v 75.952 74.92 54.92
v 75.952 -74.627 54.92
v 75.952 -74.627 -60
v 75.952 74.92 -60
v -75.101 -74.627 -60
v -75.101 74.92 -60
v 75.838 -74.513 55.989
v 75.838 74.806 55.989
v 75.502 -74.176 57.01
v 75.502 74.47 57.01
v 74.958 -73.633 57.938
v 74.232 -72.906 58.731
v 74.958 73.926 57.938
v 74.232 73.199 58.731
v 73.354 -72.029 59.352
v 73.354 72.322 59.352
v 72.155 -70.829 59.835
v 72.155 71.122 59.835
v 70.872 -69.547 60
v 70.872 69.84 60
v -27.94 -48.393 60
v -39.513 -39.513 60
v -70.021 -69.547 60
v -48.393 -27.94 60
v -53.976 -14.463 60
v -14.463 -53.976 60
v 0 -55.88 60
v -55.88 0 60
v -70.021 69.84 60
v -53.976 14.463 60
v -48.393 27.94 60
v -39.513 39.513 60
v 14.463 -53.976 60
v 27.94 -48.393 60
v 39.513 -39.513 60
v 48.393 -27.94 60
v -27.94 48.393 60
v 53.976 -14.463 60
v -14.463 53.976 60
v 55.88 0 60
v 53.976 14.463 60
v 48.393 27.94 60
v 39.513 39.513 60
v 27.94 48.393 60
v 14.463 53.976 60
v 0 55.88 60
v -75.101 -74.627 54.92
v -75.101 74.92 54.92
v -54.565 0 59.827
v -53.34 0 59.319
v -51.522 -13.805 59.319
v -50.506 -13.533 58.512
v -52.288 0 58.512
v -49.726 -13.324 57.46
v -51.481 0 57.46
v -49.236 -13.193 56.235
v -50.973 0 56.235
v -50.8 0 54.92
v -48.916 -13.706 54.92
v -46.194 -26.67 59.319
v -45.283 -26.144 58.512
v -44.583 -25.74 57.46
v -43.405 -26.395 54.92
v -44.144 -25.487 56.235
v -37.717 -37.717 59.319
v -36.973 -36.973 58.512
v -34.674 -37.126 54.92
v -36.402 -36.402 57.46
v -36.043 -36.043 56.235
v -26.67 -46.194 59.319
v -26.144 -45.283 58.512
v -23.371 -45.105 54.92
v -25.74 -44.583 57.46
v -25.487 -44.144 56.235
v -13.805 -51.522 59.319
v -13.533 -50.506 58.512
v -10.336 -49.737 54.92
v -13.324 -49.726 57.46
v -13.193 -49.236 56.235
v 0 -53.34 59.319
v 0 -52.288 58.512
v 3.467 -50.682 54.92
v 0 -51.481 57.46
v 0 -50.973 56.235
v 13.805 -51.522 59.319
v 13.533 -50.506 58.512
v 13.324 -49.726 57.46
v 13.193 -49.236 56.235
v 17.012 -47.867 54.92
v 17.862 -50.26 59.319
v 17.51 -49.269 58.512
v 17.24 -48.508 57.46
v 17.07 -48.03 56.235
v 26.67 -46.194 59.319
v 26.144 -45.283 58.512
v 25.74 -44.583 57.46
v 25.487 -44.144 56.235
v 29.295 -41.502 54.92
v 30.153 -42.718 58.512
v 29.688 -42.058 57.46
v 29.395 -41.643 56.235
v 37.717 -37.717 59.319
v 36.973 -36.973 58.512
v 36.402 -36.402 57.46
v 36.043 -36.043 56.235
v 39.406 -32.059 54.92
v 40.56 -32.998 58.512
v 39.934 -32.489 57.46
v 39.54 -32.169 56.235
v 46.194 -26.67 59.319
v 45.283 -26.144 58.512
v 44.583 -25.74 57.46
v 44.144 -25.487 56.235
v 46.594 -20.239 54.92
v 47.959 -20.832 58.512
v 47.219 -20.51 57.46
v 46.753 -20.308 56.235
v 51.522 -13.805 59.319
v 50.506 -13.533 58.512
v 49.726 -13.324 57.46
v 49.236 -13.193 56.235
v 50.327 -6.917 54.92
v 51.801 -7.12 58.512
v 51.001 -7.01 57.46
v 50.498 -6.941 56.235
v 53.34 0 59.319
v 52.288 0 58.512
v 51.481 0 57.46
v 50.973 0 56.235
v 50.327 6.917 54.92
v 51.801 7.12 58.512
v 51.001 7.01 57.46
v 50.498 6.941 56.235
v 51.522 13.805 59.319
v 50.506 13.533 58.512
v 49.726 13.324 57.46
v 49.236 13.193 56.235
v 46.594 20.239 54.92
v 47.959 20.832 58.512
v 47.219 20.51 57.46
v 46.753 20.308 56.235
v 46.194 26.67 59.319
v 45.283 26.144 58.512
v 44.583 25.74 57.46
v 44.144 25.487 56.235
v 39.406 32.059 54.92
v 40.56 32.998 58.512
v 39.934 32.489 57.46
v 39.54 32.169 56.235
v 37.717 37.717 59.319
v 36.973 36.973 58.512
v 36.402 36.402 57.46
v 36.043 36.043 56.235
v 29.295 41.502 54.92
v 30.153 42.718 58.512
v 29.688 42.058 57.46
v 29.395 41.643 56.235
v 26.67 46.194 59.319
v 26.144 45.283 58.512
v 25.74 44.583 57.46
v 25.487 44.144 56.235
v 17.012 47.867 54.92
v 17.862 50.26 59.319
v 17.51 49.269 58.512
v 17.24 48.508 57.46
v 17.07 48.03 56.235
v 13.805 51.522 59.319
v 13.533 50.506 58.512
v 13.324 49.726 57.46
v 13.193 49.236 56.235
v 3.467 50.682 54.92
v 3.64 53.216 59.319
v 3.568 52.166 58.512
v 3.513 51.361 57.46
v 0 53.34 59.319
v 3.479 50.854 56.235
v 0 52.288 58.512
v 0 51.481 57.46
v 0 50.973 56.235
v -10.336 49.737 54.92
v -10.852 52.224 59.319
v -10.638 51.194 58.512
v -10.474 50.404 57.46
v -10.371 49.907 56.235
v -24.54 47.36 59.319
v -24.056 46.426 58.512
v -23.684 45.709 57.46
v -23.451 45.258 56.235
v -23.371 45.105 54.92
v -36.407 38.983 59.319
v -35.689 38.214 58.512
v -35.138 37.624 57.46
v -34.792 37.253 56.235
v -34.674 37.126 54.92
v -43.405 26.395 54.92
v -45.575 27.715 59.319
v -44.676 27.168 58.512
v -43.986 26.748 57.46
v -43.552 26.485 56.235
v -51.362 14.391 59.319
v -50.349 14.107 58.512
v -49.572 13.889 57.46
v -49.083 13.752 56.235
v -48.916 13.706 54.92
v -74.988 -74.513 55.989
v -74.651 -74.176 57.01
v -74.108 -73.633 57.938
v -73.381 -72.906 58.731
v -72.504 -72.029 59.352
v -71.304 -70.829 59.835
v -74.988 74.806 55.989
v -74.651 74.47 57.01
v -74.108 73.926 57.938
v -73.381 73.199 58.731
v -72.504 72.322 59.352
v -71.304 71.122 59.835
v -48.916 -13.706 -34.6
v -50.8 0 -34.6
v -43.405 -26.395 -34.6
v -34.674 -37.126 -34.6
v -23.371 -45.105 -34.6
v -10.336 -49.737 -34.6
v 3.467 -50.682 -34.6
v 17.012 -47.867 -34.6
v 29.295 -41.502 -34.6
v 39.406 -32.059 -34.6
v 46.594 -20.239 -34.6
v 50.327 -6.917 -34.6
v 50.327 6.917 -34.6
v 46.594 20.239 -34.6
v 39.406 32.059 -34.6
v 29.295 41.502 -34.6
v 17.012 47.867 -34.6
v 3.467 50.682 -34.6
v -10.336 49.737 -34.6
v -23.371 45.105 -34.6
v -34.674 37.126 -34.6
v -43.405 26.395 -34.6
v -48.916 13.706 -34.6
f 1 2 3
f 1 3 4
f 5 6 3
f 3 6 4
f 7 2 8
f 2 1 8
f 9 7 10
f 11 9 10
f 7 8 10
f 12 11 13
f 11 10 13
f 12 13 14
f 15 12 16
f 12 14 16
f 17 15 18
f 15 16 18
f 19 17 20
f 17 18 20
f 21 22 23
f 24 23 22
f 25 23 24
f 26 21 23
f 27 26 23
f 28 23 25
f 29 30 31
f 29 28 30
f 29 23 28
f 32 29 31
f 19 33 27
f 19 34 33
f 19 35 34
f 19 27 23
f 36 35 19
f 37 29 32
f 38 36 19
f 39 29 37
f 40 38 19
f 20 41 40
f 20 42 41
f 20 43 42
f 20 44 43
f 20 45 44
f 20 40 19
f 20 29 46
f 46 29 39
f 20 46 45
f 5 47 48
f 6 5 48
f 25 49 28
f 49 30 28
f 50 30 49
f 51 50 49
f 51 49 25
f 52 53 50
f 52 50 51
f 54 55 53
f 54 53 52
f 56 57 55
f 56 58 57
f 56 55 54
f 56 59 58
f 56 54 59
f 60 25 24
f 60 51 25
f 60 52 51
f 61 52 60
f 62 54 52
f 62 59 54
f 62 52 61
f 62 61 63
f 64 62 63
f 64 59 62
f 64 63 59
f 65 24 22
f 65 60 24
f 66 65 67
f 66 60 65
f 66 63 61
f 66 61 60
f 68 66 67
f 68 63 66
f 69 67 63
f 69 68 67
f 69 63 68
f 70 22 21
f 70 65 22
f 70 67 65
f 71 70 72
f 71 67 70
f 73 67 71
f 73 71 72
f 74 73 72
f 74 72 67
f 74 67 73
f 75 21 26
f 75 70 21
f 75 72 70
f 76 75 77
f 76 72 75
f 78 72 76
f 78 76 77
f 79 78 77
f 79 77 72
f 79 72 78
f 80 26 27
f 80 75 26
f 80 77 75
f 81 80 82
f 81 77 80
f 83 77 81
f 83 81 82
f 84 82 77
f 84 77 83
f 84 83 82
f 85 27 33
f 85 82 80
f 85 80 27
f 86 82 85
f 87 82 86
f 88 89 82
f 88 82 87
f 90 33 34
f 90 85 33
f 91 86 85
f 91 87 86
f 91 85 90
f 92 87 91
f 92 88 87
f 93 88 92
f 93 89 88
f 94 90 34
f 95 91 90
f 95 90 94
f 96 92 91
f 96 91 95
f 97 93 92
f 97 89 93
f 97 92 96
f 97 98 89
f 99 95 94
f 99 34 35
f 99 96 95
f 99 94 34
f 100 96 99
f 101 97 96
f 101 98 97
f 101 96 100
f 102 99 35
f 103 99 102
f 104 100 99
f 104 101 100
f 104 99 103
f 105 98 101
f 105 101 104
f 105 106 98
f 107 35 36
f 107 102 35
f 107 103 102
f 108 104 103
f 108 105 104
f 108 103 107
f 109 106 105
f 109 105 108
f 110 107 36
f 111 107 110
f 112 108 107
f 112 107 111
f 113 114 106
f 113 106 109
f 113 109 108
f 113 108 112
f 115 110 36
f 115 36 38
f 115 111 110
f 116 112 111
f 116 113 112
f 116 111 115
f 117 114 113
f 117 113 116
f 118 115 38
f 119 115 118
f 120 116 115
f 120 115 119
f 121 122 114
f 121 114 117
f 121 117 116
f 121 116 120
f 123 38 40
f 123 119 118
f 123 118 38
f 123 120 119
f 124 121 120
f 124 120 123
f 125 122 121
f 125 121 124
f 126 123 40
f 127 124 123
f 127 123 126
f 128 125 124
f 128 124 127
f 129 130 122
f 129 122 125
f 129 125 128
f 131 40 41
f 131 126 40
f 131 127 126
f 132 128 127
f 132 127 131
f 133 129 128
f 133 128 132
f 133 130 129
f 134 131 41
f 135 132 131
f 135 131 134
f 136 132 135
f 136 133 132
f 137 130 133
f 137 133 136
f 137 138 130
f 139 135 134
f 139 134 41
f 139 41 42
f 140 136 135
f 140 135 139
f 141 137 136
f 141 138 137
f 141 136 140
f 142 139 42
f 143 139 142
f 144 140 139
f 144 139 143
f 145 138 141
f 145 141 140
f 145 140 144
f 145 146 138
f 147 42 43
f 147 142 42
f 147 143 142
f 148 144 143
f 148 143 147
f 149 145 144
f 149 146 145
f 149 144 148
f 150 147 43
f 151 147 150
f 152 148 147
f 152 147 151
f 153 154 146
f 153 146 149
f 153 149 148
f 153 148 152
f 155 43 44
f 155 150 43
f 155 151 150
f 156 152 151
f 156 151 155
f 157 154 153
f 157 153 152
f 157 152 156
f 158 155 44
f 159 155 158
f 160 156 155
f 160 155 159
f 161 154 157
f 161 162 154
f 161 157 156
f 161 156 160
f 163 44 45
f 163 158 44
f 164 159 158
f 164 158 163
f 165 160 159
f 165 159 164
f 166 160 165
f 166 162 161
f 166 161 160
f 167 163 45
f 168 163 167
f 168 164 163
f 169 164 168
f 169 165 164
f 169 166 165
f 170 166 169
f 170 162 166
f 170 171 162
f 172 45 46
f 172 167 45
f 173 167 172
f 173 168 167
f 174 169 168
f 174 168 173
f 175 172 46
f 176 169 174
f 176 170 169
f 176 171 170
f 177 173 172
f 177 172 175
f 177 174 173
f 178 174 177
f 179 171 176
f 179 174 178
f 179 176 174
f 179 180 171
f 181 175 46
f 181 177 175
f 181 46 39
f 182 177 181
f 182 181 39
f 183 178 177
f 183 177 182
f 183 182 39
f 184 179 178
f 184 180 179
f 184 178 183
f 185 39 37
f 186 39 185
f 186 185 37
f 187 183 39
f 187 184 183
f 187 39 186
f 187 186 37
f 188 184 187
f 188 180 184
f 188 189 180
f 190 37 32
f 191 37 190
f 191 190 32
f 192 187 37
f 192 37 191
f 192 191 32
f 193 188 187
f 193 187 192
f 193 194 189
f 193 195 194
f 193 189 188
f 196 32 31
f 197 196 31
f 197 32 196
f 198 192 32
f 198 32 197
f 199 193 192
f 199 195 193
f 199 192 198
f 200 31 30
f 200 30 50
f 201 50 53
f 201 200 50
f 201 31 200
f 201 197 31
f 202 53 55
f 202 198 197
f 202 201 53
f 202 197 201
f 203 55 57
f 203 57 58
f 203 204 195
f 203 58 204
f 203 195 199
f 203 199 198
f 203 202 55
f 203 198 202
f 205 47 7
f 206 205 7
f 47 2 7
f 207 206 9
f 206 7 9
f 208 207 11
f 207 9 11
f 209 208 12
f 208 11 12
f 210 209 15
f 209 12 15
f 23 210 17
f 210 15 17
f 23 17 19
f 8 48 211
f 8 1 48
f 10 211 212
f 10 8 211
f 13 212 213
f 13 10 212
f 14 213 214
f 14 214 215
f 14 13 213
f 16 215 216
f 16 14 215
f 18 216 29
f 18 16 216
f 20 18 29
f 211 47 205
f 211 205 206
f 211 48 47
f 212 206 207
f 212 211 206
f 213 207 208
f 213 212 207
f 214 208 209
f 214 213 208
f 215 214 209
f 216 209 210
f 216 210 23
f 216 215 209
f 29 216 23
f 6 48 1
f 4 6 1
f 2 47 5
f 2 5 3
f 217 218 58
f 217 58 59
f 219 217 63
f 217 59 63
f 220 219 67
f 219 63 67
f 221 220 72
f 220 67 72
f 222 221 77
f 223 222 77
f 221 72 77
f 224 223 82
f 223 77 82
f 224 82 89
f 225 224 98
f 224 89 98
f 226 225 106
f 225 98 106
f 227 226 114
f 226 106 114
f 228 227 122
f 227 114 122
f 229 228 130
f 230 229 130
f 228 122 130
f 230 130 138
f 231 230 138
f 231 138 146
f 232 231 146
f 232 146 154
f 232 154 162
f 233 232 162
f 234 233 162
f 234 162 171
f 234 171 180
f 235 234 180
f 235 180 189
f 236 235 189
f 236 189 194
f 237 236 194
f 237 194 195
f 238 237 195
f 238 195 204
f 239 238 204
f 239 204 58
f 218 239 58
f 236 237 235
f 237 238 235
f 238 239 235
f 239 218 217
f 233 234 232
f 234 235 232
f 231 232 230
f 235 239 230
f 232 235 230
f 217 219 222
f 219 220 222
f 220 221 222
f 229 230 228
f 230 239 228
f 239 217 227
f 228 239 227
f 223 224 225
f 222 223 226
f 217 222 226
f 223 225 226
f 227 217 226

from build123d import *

# Parameters (mm, degrees)
F0_W     = 151.0536894202
F0_H     = 149.5463699102
F1_DEPTH = 60
F3_D     = 101.6
F2_R     = 50.8282360812
F4_DEPTH = 25.4
F8_R     = 5.08


# Not quite as in the source:
# - the program builds the solid bodies; features that only make, move or delete a surface that nothing else refers to are left out


with BuildPart() as f1:
    # F0 (on Top) → F1 (new body, symmetric)
    with BuildSketch(Plane.XY):
        with Locations((0.4253648221, 0.1466497779)):
            Rectangle(F0_W, F0_H)
    extrude(amount=F1_DEPTH, both=True)

    # F3 (through all)
    with Locations(Plane(origin=(0, 0, -60), x_dir=(1, 0, 0), z_dir=(0, 0, -1))):
        with Locations((0, 0)):
            Hole(F3_D / 2)

    # F2 (on face) → F4 (join)
    with BuildSketch(Plane(origin=(0, 0, -60), x_dir=(1, 0, 0), z_dir=(0, 0, -1))):
        Circle(F2_R)
    extrude(amount=-F4_DEPTH)

    # F8
    f8_edges = [f1.edges().sort_by_distance(p)[0] for p in [
        (-75.10148, 0.14665, 60),
        (0.425365, 74.919835, 60),
        (0.425365, -74.626535, 60),
        (75.95221, 0.14665, 60),
        (-50.8, 0, 60),
    ]]
    fillet(f8_edges, radius=F8_R)


solid = f1.part
